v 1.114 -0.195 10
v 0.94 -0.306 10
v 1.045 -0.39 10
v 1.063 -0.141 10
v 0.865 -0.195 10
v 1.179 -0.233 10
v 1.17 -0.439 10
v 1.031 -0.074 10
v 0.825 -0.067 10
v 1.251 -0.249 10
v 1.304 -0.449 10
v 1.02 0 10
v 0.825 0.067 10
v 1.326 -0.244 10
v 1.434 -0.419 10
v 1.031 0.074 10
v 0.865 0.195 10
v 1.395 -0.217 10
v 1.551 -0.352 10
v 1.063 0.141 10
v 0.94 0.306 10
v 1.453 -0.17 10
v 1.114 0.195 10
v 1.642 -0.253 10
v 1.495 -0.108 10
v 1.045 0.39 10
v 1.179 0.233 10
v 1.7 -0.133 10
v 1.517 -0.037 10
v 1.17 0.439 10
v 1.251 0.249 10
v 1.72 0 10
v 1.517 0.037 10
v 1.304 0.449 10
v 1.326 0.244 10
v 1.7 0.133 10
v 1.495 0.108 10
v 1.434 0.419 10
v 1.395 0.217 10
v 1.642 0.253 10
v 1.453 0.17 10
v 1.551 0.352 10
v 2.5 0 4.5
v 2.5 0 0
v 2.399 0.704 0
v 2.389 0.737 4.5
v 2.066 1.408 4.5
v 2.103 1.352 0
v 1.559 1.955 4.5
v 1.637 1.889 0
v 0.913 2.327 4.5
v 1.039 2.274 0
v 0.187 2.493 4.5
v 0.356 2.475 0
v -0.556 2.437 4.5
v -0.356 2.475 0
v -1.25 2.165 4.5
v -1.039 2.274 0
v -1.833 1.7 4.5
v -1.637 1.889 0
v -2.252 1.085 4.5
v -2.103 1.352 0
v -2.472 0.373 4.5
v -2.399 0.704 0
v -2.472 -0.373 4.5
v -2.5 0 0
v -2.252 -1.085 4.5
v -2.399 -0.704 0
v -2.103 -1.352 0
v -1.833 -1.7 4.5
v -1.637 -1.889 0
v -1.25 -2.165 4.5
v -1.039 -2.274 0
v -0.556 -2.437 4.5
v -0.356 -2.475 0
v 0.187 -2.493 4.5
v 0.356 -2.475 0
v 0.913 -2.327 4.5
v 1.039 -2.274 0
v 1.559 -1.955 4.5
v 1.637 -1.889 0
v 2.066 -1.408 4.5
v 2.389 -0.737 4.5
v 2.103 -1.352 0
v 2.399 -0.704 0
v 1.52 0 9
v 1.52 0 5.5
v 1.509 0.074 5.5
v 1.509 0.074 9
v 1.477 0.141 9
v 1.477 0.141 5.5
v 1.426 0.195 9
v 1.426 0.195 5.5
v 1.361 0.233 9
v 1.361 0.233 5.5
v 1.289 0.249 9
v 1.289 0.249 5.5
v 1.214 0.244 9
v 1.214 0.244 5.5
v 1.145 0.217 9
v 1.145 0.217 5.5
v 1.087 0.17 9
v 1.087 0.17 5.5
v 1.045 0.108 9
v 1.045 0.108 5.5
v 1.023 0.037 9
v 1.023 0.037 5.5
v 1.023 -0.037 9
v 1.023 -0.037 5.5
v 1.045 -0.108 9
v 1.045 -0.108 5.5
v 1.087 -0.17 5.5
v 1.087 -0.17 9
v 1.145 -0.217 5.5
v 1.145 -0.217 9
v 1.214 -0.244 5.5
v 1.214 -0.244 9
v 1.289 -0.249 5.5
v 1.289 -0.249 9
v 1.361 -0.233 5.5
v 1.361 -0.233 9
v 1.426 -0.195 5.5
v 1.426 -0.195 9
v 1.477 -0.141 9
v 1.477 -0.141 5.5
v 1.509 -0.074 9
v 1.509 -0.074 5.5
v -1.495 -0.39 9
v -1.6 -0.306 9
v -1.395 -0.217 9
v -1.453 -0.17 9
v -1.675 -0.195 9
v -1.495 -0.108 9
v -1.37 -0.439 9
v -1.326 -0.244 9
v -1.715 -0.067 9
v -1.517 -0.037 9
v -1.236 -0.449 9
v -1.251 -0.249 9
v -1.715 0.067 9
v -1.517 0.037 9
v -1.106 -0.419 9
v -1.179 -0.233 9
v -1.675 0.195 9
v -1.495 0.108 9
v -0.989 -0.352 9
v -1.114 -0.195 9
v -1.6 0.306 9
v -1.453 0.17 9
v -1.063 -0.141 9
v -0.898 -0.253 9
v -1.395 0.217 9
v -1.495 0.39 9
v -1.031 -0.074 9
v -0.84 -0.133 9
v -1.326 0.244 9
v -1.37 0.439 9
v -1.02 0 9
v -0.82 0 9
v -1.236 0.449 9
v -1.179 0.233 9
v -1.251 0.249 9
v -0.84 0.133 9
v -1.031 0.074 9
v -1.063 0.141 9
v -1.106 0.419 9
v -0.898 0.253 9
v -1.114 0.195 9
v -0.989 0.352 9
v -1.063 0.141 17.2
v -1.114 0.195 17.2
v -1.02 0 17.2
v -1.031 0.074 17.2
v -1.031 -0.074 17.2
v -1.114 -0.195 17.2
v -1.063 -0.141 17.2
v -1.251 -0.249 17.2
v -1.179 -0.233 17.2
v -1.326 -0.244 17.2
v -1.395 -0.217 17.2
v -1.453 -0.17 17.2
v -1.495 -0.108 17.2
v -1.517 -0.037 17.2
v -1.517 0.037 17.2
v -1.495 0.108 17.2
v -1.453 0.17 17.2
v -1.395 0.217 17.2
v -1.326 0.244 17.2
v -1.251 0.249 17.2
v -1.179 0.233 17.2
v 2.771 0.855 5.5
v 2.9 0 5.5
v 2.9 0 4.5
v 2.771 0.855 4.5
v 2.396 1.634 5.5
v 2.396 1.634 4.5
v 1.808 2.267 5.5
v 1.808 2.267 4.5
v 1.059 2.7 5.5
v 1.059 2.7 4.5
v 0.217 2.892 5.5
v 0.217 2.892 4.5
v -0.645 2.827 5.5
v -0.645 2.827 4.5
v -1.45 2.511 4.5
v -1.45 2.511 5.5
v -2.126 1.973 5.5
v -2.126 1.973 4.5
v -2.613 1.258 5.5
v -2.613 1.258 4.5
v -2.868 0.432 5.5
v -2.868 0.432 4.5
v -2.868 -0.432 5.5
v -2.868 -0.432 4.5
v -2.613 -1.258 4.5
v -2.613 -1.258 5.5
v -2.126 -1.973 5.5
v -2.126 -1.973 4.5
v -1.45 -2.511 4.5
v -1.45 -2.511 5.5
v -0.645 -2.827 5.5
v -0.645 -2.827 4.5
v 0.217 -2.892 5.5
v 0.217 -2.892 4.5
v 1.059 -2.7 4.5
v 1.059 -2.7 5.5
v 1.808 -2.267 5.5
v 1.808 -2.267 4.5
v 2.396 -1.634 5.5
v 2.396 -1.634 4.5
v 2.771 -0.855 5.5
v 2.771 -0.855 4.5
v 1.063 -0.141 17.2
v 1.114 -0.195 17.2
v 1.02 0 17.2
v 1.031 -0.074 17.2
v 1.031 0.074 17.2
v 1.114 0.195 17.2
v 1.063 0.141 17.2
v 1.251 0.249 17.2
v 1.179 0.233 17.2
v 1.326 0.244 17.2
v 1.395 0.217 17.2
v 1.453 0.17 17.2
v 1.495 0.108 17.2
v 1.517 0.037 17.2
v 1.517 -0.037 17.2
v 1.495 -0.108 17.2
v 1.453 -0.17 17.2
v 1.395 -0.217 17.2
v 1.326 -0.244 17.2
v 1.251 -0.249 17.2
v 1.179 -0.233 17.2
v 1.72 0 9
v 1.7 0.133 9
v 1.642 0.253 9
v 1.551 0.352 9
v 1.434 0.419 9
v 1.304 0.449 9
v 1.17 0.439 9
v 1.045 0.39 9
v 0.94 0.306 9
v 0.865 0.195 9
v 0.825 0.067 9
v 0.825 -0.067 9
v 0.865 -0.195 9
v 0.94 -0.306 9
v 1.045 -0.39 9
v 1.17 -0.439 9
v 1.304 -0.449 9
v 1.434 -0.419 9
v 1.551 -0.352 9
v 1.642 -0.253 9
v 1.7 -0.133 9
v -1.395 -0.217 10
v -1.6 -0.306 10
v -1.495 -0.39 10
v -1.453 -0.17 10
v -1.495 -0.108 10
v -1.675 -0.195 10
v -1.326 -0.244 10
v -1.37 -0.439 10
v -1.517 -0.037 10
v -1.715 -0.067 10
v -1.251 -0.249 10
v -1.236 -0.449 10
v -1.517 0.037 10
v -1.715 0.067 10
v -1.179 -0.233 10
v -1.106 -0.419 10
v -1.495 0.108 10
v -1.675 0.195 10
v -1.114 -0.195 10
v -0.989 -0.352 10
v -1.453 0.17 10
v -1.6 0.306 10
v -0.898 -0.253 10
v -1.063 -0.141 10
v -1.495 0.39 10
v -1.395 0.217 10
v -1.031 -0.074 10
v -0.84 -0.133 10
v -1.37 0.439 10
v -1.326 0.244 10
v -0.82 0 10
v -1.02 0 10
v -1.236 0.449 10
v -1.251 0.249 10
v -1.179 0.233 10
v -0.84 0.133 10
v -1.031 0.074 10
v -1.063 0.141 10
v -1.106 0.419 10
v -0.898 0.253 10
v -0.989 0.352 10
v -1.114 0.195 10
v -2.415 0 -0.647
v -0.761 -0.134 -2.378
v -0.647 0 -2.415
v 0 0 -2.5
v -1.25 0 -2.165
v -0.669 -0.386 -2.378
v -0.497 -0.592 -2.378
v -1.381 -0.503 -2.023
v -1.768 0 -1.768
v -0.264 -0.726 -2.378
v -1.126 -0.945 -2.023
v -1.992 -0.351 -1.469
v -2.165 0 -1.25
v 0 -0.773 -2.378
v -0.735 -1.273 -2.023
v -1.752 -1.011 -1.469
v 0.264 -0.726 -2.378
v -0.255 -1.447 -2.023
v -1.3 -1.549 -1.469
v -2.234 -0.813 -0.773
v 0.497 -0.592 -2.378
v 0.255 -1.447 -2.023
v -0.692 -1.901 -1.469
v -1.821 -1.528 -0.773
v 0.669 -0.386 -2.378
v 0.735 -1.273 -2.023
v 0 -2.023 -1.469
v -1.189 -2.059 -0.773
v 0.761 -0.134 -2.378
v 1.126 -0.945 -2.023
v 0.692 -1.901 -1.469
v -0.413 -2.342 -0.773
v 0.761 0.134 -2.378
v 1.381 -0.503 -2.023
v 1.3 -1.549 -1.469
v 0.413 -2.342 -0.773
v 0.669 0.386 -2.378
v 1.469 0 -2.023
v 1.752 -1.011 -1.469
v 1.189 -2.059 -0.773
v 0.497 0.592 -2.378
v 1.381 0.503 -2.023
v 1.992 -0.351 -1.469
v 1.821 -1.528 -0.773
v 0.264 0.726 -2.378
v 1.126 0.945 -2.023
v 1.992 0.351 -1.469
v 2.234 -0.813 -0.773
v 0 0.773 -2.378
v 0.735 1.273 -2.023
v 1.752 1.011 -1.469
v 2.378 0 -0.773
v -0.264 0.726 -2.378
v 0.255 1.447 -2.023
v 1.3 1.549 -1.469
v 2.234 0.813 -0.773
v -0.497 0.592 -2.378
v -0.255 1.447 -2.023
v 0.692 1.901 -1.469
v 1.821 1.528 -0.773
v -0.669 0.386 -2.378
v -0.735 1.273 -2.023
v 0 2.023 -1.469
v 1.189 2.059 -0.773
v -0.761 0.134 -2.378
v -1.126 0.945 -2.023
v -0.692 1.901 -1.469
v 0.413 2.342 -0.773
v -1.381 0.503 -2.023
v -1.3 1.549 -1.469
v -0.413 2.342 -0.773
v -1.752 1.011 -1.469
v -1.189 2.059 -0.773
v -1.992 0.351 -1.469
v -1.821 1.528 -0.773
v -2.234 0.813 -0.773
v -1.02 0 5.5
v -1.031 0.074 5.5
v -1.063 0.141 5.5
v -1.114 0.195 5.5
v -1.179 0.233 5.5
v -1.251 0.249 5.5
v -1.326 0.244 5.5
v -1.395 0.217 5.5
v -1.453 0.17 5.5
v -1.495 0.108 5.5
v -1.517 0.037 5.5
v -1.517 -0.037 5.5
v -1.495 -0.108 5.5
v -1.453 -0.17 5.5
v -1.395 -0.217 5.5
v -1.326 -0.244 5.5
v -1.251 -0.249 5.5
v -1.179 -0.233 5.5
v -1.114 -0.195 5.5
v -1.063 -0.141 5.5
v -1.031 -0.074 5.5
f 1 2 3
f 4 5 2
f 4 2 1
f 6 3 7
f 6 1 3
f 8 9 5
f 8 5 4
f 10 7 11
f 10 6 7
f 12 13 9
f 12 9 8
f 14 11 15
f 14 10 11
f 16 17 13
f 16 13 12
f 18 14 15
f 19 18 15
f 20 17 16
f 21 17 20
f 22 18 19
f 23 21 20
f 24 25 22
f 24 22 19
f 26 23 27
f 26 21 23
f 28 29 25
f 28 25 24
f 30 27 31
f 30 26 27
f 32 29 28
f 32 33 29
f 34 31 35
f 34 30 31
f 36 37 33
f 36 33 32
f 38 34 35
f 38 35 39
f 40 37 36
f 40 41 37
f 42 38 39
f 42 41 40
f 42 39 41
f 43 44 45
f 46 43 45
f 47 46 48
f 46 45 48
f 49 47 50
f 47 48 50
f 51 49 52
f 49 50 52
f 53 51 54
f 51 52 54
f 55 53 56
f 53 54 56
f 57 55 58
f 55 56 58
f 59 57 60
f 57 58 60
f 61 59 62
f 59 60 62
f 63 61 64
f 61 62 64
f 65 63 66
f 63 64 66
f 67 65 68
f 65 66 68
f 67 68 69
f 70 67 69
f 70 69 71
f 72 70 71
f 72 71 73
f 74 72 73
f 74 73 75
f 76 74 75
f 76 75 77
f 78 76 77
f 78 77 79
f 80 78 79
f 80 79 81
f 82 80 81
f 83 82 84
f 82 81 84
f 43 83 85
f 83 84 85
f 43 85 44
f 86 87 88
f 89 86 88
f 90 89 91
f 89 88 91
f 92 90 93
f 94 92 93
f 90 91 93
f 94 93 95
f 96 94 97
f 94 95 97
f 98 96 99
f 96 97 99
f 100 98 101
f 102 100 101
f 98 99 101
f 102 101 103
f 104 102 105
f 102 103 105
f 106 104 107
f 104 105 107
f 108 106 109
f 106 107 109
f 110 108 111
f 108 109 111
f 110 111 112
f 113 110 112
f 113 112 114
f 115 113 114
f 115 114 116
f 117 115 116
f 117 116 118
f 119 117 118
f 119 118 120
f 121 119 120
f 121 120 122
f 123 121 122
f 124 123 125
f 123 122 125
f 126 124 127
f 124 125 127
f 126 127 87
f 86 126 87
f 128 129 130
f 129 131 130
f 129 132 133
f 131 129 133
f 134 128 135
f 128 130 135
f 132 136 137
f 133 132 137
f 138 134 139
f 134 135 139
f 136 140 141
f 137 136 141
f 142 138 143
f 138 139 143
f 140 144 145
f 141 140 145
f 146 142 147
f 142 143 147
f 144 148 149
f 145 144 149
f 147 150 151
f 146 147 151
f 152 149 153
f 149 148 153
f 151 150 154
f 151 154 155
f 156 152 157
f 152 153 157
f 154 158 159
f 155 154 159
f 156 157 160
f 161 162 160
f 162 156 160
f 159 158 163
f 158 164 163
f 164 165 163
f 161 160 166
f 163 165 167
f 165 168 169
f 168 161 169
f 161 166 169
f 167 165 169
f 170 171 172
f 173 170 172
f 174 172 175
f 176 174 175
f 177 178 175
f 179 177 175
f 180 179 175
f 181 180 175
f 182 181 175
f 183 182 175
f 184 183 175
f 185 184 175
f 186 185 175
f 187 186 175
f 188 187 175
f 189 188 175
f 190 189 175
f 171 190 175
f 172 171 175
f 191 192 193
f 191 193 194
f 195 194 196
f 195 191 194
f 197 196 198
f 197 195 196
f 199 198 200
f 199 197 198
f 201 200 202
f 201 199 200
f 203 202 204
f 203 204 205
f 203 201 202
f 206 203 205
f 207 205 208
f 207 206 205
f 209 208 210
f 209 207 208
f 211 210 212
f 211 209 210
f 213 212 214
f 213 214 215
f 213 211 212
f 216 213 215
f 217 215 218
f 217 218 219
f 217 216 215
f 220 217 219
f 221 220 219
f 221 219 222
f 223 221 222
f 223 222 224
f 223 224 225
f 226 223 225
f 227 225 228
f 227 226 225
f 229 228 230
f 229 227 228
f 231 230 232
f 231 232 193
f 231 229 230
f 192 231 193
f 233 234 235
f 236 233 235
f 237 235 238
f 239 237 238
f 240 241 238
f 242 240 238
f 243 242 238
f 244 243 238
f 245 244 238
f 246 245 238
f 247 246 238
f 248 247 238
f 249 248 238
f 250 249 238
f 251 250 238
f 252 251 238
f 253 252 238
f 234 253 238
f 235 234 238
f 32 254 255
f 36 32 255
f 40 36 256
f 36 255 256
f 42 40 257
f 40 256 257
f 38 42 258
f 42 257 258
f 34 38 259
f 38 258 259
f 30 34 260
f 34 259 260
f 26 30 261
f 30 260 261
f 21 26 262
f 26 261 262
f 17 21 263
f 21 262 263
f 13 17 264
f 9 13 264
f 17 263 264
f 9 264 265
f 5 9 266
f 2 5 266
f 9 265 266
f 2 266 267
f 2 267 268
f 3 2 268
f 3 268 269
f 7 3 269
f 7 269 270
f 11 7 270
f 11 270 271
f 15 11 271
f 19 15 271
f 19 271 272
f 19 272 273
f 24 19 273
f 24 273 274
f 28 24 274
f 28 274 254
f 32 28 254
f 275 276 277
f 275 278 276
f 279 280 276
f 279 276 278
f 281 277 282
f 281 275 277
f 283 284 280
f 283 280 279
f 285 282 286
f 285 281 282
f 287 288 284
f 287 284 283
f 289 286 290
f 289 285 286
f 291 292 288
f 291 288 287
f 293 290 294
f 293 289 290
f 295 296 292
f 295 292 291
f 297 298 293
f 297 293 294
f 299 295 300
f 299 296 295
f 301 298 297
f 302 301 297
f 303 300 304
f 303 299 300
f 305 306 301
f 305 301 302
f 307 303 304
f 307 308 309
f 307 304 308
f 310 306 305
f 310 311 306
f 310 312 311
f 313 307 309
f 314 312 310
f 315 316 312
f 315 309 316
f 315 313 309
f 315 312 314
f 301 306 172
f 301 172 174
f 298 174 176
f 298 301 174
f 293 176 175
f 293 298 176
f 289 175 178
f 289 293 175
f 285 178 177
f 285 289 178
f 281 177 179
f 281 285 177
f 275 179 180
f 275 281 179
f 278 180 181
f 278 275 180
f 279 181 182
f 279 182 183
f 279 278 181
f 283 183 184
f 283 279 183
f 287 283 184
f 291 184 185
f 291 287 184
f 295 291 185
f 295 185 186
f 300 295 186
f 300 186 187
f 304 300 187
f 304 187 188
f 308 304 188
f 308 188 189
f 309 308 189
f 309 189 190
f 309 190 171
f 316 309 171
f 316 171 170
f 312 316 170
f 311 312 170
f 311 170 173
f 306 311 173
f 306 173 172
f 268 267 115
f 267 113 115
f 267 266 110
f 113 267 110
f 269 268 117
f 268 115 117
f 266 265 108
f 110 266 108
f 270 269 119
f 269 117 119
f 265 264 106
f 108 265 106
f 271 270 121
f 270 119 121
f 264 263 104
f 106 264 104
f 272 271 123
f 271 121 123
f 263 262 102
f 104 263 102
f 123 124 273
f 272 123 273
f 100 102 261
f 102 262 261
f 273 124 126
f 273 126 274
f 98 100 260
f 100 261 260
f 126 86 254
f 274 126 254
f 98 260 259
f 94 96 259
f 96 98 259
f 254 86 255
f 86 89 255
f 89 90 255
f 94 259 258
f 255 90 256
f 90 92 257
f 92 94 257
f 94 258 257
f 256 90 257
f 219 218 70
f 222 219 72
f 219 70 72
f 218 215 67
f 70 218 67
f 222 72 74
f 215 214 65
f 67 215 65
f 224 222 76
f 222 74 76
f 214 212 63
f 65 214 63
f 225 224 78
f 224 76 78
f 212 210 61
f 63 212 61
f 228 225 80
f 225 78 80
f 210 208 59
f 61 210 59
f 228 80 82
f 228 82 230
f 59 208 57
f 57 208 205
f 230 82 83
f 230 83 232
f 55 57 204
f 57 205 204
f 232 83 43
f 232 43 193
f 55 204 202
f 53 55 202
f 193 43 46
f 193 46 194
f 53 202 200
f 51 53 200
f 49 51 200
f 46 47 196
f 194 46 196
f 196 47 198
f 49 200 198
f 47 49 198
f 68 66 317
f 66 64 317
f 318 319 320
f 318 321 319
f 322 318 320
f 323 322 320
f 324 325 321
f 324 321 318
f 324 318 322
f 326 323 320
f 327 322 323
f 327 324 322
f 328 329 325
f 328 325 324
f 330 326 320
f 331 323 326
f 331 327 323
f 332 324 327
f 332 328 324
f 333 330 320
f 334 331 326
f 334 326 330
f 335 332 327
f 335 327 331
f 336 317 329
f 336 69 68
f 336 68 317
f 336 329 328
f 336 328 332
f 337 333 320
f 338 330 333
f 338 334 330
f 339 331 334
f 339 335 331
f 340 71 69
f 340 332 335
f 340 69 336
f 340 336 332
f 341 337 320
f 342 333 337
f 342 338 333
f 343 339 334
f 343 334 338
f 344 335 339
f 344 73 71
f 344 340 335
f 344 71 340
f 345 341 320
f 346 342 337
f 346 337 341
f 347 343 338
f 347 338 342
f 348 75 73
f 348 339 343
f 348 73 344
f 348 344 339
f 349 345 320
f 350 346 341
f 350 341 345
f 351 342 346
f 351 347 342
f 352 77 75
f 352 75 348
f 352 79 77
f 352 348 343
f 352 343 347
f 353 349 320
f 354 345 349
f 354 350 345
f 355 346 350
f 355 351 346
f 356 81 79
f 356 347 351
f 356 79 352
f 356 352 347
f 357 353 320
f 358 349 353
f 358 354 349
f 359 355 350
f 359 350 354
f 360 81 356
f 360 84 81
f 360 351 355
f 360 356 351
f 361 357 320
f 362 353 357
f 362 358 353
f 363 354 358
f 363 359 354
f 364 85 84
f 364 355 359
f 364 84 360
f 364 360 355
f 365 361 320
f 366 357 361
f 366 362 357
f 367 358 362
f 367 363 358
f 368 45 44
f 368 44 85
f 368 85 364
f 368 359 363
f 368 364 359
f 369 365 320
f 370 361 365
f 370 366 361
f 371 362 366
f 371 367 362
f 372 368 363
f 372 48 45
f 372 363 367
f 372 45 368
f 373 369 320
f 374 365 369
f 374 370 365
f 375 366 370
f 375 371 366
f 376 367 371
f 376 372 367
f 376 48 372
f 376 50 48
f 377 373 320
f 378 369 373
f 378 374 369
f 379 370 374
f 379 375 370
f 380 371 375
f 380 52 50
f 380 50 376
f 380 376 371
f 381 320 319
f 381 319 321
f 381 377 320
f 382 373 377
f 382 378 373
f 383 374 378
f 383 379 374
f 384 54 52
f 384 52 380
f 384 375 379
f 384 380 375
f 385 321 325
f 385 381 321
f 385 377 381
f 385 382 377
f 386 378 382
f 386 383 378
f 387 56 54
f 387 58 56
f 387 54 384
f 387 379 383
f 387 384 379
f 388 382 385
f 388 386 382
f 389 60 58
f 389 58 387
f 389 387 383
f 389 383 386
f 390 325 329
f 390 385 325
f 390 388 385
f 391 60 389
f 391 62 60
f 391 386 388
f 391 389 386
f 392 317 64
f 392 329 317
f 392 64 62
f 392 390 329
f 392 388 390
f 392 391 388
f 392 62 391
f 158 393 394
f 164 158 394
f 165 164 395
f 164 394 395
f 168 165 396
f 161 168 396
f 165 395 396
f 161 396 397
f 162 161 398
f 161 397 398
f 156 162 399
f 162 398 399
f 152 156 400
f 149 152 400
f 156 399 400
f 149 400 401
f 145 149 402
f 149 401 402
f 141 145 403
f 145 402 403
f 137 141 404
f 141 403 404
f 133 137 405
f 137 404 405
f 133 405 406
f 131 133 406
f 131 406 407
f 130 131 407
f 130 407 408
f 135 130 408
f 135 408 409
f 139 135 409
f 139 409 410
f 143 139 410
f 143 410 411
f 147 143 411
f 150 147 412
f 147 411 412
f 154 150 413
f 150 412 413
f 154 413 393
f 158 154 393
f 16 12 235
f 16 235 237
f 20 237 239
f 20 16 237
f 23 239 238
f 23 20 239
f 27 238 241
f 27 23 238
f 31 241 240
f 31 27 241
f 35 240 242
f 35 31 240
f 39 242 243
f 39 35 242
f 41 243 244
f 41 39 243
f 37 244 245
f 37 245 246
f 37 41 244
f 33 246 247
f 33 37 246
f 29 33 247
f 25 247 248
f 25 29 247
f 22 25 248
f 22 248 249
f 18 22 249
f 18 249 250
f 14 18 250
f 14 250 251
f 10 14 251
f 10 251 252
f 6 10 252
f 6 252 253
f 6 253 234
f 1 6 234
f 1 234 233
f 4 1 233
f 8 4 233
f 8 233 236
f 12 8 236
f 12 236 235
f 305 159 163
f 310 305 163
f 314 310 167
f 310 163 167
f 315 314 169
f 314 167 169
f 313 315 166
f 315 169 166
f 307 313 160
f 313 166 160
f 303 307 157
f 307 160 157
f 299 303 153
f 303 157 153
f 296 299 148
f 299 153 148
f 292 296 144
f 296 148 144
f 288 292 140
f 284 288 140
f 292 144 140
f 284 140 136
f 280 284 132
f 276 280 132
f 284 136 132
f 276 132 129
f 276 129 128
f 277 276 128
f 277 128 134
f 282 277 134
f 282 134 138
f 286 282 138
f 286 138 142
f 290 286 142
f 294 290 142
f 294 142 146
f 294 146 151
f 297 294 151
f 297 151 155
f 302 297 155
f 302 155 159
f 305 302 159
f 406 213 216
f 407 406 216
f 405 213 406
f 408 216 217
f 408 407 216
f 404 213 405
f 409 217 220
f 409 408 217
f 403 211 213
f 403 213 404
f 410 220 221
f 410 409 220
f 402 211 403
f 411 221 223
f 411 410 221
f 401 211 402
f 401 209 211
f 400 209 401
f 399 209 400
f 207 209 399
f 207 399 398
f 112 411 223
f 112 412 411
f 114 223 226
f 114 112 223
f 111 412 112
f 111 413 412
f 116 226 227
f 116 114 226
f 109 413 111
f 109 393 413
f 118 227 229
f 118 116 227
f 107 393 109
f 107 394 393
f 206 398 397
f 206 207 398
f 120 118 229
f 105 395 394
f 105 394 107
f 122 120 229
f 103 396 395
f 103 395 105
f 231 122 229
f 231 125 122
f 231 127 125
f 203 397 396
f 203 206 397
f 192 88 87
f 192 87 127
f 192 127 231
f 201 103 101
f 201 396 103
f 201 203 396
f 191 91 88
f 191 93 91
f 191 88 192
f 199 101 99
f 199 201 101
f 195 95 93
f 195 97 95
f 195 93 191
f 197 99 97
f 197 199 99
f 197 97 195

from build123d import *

# Parameters (mm, degrees)
SKETCH_1_R          = 2.5
EXTRUDE_1_DEPTH     = 5.5
SKETCH_2_R          = 2.9
EXTRUDE_2_DEPTH     = 1
SKETCH_3_R          = 0.25
EXTRUDE_3_DEPTH     = 12.7
SKETCH_6_R          = 0.45
SKETCH_6_R_2        = 0.25
EXTRUDE_1_2_DEPTH   = 4.5
SKETCH_7_R          = 0.45
SKETCH_7_R_2        = 0.25
CUT_EXTRUDE_2_DEPTH = 3.5


with BuildPart() as part:
    # 草图1 → Extrude 1 (new body)
    with BuildSketch(Plane.XY):
        Circle(SKETCH_1_R)
    extrude(amount=EXTRUDE_1_DEPTH)

    # 草图2 → 拉伸2 (add)
    with BuildSketch(Plane.XY.offset(5.5)):
        Circle(SKETCH_2_R)
    extrude(amount=-EXTRUDE_2_DEPTH)

    # 草图3 → 拉伸3 (add)
    with BuildSketch(Plane(origin=(0, 0, 4.5), x_dir=(-1, 0, 0), z_dir=(0, 0, -1))):
        with Locations((-1.27, 0)):
            Circle(SKETCH_3_R)
        with Locations(Location((1.27, 0, 0), (0, 0, 180))):
            Circle(SKETCH_3_R)
    extrude(amount=-EXTRUDE_3_DEPTH)

    # 草图5 → 旋转2 (revolve)
    with BuildSketch(Plane(origin=(0, 0, 0), x_dir=(0, 0, -1), z_dir=(1, 0, 0)), mode=Mode.PRIVATE) as revolve_2_sk:
        with BuildLine():
            Line((0, 2.5), (0, 0))
            Line((0, 0), (2.5, 0))
            ThreePointArc((2.5, 0), (1.767766953, 1.767766953), (0, 2.5))
        make_face()
    revolve(revolve_2_sk.sketch.rotate(Axis((0, 0, -2.5), (0, 0, 1)), 90), axis=Axis((0, 0, -2.5), (0, 0, 1)))

    # 草图6 → Extrude 1 2 (add)
    # profile 1 of 2: a face of its own
    with BuildSketch(Plane.XY.offset(5.5)):
        with Locations((-1.27, 0)):
            Circle(SKETCH_6_R)
        with Locations((-1.27, 0)):
            Circle(SKETCH_6_R_2, mode=Mode.SUBTRACT)
    # profile 2 of 2: a face of its own
    with BuildSketch(Plane.XY.offset(5.5)):
        with Locations((1.27, 0)):
            Circle(SKETCH_6_R)
        with Locations(Location((1.27, 0, 0), (0, 0, 180))):
            Circle(SKETCH_6_R_2, mode=Mode.SUBTRACT)
    extrude(amount=EXTRUDE_1_2_DEPTH)

    # 草图7 → 切除-拉伸2 (cut)
    # profile 1 of 2: a face of its own
    with BuildSketch(Plane.XY.offset(5.5)):
        with Locations((-1.27, 0)):
            Circle(SKETCH_7_R)
        with Locations((-1.27, 0)):
            Circle(SKETCH_7_R_2, mode=Mode.SUBTRACT)
    # profile 2 of 2: a face of its own
    with BuildSketch(Plane.XY.offset(5.5)):
        with Locations((1.27, 0)):
            Circle(SKETCH_7_R)
        with Locations((1.27, 0)):
            Circle(SKETCH_7_R_2, mode=Mode.SUBTRACT)
    extrude(amount=CUT_EXTRUDE_2_DEPTH, mode=Mode.SUBTRACT)


solid = part.part
